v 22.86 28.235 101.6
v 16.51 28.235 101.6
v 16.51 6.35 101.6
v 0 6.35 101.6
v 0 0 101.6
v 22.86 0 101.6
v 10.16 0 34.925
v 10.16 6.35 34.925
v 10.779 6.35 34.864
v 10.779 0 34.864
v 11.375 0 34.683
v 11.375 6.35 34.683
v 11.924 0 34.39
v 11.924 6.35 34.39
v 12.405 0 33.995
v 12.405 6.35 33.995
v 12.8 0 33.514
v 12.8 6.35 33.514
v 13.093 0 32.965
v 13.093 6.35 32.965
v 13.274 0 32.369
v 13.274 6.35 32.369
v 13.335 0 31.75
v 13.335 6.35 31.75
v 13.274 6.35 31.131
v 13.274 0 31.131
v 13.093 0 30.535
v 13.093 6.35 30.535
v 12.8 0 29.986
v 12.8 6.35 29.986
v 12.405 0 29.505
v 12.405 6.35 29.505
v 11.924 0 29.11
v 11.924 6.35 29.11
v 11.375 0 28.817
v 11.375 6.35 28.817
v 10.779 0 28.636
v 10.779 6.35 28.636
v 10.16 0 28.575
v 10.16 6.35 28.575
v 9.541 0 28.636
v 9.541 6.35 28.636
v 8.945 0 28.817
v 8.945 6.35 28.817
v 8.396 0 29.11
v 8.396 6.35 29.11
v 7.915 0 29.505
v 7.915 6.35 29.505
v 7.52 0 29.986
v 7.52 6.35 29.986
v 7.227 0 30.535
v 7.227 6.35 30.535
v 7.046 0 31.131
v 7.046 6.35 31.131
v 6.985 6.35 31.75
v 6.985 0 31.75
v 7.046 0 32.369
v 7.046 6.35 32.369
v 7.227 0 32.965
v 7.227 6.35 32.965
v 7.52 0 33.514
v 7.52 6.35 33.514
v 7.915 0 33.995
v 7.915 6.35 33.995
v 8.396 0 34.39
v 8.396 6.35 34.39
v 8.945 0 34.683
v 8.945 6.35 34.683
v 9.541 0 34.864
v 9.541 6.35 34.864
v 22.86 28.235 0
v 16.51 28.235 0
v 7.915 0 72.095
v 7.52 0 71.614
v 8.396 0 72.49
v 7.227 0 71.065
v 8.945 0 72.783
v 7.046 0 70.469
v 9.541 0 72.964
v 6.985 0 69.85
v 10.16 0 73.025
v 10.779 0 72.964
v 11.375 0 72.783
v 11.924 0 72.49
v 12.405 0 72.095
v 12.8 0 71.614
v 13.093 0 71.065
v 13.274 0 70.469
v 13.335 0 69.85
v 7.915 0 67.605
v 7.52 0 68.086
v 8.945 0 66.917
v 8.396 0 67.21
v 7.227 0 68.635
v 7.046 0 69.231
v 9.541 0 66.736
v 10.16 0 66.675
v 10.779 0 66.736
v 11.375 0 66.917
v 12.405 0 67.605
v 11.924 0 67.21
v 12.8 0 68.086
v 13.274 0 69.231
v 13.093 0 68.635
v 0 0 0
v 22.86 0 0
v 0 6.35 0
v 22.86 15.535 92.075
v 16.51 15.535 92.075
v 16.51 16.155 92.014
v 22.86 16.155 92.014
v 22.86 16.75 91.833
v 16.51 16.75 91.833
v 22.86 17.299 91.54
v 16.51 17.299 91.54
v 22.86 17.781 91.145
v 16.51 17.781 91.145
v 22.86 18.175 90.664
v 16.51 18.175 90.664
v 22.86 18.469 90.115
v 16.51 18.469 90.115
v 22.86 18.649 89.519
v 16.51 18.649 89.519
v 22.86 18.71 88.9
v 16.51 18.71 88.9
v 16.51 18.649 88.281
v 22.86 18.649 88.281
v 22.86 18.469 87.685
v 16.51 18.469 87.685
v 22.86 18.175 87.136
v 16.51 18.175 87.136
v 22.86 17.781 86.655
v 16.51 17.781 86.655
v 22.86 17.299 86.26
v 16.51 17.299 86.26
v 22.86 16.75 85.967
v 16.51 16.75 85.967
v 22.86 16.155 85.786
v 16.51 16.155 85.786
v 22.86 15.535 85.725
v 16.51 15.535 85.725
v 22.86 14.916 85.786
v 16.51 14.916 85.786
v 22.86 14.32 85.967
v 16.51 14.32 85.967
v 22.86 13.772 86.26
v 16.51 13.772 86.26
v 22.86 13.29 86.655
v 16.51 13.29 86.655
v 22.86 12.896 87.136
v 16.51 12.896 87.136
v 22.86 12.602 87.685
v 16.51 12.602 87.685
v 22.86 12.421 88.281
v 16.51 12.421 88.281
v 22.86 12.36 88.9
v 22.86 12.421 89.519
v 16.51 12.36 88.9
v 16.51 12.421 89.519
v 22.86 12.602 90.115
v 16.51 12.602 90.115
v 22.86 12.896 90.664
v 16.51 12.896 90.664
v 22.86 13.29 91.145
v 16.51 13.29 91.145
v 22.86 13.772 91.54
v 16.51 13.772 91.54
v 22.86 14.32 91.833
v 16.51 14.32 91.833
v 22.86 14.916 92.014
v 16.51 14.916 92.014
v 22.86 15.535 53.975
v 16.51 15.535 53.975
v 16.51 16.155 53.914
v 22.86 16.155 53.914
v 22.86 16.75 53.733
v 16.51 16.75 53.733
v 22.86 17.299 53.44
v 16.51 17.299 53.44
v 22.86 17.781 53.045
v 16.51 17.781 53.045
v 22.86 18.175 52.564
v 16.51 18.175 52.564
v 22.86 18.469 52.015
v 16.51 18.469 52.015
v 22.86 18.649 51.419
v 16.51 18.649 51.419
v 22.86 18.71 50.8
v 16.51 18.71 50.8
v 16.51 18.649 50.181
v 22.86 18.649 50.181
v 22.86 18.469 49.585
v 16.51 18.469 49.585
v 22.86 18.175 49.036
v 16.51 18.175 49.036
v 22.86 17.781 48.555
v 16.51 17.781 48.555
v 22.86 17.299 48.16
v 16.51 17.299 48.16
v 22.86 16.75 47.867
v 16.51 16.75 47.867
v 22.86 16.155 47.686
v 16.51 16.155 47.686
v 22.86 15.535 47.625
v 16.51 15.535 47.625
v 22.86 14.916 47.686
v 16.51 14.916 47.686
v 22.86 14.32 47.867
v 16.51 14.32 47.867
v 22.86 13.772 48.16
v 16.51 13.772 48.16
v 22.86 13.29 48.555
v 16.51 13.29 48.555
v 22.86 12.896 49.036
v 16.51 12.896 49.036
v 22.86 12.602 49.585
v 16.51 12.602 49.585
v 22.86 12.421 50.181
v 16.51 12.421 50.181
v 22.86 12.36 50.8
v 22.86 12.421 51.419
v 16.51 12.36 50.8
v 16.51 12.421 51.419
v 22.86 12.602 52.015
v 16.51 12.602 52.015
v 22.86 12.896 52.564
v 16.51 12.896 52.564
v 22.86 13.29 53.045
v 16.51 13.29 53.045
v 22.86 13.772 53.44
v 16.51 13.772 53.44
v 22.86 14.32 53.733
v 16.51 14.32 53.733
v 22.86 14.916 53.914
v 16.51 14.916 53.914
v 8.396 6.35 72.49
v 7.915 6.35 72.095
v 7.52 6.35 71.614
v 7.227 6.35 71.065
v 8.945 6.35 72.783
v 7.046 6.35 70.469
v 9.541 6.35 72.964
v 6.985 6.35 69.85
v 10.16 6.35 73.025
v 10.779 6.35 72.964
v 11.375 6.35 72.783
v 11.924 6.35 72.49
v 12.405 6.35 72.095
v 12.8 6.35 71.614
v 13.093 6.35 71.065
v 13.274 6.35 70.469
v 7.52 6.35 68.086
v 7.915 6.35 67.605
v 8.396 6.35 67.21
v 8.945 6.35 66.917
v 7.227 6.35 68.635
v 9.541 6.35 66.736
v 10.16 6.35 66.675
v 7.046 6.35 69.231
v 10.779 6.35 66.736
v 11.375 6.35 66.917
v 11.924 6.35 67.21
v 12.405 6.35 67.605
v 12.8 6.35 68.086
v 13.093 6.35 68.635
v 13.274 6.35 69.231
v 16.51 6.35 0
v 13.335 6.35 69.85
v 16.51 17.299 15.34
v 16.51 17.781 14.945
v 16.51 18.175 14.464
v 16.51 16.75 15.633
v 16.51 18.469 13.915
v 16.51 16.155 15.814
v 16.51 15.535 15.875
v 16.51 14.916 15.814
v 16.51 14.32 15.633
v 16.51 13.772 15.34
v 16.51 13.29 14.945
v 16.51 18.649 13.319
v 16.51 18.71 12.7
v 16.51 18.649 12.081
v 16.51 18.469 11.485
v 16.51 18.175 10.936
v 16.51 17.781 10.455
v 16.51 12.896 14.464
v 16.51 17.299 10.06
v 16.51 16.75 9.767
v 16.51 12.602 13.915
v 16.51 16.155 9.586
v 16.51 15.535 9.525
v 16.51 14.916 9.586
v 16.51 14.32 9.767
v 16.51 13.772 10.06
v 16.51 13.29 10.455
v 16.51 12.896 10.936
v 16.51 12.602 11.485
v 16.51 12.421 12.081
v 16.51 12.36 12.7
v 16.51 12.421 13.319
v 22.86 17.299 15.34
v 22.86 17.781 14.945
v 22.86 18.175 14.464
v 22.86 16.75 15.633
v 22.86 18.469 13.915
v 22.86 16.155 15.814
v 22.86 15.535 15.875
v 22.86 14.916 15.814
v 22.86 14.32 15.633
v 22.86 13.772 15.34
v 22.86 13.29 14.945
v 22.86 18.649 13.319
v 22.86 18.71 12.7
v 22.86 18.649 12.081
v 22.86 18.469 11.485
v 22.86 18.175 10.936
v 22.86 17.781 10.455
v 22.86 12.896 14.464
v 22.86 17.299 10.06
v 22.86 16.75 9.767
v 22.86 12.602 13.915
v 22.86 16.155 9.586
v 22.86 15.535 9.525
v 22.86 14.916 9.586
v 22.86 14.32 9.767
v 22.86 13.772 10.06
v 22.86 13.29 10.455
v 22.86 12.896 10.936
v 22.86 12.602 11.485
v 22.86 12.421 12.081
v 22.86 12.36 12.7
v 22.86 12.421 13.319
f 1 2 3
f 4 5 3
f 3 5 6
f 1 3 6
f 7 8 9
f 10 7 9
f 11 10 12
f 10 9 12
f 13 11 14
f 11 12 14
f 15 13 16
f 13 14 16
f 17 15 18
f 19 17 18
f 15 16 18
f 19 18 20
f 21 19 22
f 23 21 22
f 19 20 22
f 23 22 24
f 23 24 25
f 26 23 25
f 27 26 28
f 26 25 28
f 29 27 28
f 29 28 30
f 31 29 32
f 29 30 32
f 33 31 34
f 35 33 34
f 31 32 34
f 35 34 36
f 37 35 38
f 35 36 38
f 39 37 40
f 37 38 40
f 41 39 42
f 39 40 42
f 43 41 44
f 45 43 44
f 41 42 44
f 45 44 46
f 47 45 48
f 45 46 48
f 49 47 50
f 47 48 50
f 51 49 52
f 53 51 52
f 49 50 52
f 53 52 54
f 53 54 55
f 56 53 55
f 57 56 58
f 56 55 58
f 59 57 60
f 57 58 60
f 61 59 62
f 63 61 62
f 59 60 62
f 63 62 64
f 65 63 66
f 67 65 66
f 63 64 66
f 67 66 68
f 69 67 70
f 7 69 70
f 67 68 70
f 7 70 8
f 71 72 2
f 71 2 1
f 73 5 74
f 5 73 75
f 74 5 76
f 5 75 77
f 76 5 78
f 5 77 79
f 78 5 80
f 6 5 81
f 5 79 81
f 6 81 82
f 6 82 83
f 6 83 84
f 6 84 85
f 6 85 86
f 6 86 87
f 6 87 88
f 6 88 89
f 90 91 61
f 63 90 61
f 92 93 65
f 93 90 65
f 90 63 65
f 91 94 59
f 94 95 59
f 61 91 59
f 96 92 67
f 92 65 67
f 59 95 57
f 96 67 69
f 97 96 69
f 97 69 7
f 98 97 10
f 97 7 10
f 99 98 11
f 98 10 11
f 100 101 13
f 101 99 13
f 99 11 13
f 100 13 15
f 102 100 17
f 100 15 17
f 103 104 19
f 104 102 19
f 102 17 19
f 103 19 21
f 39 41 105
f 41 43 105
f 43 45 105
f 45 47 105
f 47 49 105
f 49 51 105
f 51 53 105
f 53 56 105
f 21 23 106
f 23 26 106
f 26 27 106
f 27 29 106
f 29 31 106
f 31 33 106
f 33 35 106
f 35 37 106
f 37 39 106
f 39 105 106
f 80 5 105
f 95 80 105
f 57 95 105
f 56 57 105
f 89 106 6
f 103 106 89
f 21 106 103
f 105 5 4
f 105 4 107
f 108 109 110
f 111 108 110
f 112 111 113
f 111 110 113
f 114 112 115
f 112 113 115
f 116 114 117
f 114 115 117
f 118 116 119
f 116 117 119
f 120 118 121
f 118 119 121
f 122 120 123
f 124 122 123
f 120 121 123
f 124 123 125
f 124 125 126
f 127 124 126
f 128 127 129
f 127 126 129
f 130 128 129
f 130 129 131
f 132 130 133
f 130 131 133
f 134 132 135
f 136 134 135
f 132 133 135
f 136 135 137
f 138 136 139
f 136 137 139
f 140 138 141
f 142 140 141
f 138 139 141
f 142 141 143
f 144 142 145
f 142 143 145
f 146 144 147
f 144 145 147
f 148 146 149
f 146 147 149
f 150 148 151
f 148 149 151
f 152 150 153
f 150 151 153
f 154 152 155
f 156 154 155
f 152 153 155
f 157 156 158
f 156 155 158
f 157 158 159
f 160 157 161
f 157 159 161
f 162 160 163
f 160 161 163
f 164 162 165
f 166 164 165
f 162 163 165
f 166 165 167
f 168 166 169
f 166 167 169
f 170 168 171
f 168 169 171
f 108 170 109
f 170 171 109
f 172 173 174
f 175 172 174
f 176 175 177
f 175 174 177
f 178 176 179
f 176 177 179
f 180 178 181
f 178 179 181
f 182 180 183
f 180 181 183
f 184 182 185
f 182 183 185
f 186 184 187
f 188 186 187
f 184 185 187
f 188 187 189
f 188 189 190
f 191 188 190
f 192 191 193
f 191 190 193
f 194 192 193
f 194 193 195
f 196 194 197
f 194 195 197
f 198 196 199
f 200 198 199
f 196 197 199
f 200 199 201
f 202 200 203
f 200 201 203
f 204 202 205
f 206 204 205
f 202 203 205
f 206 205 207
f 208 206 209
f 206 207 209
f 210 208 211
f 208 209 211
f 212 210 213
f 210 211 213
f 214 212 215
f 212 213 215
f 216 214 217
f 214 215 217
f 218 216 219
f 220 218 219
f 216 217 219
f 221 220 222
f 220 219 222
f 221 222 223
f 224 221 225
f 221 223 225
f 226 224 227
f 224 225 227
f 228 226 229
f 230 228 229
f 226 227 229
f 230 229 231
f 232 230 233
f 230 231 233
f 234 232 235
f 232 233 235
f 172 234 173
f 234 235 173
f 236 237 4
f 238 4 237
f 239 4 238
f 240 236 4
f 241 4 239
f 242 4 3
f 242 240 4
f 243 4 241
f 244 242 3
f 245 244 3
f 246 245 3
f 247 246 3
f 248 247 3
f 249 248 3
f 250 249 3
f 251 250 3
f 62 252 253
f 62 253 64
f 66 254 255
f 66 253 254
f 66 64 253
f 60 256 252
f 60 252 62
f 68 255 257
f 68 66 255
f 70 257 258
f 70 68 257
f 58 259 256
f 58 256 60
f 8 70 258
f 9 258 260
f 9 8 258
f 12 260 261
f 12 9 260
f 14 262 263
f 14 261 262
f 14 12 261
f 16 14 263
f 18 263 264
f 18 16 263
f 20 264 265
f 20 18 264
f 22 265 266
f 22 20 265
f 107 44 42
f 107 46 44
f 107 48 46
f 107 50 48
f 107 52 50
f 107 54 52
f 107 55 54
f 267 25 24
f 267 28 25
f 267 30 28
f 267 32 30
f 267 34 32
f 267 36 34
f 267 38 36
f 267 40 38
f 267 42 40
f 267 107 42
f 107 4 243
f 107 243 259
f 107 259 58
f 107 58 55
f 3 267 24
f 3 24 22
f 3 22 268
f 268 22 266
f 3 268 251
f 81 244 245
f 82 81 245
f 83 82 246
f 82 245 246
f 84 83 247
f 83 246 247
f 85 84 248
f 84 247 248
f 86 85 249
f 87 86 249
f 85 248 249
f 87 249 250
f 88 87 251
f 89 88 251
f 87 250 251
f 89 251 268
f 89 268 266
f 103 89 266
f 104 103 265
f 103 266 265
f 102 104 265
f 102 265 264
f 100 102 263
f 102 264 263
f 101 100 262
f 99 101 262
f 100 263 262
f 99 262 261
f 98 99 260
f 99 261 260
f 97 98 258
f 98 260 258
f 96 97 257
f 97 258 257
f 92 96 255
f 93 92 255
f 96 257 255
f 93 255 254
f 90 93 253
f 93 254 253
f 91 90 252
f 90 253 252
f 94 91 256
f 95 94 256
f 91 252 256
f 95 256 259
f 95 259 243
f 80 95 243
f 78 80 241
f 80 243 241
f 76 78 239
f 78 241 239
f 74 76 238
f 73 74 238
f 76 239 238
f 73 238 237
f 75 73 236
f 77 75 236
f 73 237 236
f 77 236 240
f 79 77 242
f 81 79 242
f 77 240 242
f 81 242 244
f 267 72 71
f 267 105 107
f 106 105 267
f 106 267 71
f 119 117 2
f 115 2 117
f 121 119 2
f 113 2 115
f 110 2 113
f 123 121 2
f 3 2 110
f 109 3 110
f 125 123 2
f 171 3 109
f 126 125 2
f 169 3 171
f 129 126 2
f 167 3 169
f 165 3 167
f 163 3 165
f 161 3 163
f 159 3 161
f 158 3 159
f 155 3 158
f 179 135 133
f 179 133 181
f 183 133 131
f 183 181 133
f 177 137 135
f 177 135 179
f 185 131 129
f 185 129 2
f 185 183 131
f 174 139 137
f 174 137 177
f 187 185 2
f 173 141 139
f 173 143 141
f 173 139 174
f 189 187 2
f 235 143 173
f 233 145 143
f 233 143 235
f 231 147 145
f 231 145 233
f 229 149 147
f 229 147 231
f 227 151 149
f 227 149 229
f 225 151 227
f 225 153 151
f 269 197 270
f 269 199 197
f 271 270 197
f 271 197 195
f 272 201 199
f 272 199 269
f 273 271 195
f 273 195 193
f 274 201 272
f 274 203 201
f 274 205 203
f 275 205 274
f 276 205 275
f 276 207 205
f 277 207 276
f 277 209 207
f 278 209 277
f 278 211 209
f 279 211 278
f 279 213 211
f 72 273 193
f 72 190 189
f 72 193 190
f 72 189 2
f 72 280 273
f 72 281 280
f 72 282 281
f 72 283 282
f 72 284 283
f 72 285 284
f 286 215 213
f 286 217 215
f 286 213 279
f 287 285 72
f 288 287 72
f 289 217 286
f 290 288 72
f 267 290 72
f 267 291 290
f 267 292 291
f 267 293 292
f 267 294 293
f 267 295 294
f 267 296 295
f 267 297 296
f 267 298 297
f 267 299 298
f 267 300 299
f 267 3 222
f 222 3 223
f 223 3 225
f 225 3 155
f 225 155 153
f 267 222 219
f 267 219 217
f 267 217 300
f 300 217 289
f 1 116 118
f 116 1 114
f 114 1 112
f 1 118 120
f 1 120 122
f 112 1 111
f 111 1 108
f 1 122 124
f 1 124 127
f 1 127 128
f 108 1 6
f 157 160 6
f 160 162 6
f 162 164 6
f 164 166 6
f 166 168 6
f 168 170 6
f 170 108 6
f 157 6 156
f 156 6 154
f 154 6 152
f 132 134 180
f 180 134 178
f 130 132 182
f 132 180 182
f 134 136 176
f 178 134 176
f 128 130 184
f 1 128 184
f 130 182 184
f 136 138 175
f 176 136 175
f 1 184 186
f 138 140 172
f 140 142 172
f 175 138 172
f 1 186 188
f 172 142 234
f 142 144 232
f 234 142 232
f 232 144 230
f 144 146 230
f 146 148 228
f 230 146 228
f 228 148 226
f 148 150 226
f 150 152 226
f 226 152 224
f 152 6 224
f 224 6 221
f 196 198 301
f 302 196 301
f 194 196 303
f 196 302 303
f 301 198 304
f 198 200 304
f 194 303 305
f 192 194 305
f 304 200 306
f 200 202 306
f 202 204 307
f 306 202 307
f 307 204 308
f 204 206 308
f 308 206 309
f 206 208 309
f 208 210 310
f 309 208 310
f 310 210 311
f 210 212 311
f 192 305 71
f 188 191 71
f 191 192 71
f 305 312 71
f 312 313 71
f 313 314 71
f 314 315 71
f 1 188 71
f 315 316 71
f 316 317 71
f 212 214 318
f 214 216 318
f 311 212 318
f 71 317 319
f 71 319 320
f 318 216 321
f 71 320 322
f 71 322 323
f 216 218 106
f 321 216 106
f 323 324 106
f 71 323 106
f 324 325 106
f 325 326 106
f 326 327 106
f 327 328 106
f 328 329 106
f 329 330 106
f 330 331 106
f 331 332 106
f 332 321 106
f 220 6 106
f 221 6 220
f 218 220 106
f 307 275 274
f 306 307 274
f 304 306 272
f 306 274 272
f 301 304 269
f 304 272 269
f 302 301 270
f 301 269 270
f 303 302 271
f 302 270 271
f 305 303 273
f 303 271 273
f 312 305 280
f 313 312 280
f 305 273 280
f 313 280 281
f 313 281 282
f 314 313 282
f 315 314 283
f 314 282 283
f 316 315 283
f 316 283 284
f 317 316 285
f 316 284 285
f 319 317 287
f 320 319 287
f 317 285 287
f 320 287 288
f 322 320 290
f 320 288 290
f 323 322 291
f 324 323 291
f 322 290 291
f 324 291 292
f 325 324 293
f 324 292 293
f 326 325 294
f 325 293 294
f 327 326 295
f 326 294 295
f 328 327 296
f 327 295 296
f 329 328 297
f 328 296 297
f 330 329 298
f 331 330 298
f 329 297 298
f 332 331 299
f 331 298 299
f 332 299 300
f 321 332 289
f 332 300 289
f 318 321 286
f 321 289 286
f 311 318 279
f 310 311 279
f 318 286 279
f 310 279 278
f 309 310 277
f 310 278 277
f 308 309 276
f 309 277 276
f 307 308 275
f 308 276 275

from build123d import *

# Parameters (mm, degrees)
SKETCH1_W           = 22.86
SKETCH1_H           = 101.6
BOSS_EXTRUDE1_DEPTH = 6.35
SKETCH4_W           = 6.35
SKETCH4_H           = 101.6
BOSS_EXTRUDE2_DEPTH = 21.88544518
SKETCH7_R           = 3.175
CUT_EXTRUDE1_DEPTH  = 6.35
SKETCH8_R           = 3.175
CUT_EXTRUDE2_DEPTH  = 6.35


with BuildPart() as part:
    # Sketch1 → Boss-Extrude1 (new body)
    with BuildSketch(Plane(origin=(0, 0, 0), x_dir=(1, 0, 0), z_dir=(0, 1, 0))):
        with Locations((11.43, -50.8)):
            Rectangle(SKETCH1_W, SKETCH1_H)
    extrude(amount=BOSS_EXTRUDE1_DEPTH)

    # Sketch4 → Boss-Extrude2 (add)
    with BuildSketch(Plane(origin=(0, 6.35, 0), x_dir=(1, 0, 0), z_dir=(0, 1, 0))):
        with Locations((19.685, -50.8)):
            Rectangle(SKETCH4_W, SKETCH4_H)
    extrude(amount=BOSS_EXTRUDE2_DEPTH)

    # Sketch7 → Cut-Extrude1 (cut)
    with BuildSketch(Plane.ZY.offset(-16.51)):
        with Locations((88.9, 15.53544518)):
            Circle(SKETCH7_R)
        with Locations((50.8, 15.53544518)):
            Circle(SKETCH7_R)
        with Locations((12.7, 15.53544518)):
            Circle(SKETCH7_R)
    extrude(amount=-CUT_EXTRUDE1_DEPTH, mode=Mode.SUBTRACT)

    # Sketch8 → Cut-Extrude2 (cut)
    with BuildSketch(Plane(origin=(0, 6.35, 0), x_dir=(1, 0, 0), z_dir=(0, 1, 0))):
        with Locations(Location((10.16, -31.75, 0), (0, 0, 270))):
            Circle(SKETCH8_R)
        with Locations(Location((10.16, -69.85, 0), (0, 0, 270))):
            Circle(SKETCH8_R)
    extrude(amount=-CUT_EXTRUDE2_DEPTH, mode=Mode.SUBTRACT)


solid = part.part
